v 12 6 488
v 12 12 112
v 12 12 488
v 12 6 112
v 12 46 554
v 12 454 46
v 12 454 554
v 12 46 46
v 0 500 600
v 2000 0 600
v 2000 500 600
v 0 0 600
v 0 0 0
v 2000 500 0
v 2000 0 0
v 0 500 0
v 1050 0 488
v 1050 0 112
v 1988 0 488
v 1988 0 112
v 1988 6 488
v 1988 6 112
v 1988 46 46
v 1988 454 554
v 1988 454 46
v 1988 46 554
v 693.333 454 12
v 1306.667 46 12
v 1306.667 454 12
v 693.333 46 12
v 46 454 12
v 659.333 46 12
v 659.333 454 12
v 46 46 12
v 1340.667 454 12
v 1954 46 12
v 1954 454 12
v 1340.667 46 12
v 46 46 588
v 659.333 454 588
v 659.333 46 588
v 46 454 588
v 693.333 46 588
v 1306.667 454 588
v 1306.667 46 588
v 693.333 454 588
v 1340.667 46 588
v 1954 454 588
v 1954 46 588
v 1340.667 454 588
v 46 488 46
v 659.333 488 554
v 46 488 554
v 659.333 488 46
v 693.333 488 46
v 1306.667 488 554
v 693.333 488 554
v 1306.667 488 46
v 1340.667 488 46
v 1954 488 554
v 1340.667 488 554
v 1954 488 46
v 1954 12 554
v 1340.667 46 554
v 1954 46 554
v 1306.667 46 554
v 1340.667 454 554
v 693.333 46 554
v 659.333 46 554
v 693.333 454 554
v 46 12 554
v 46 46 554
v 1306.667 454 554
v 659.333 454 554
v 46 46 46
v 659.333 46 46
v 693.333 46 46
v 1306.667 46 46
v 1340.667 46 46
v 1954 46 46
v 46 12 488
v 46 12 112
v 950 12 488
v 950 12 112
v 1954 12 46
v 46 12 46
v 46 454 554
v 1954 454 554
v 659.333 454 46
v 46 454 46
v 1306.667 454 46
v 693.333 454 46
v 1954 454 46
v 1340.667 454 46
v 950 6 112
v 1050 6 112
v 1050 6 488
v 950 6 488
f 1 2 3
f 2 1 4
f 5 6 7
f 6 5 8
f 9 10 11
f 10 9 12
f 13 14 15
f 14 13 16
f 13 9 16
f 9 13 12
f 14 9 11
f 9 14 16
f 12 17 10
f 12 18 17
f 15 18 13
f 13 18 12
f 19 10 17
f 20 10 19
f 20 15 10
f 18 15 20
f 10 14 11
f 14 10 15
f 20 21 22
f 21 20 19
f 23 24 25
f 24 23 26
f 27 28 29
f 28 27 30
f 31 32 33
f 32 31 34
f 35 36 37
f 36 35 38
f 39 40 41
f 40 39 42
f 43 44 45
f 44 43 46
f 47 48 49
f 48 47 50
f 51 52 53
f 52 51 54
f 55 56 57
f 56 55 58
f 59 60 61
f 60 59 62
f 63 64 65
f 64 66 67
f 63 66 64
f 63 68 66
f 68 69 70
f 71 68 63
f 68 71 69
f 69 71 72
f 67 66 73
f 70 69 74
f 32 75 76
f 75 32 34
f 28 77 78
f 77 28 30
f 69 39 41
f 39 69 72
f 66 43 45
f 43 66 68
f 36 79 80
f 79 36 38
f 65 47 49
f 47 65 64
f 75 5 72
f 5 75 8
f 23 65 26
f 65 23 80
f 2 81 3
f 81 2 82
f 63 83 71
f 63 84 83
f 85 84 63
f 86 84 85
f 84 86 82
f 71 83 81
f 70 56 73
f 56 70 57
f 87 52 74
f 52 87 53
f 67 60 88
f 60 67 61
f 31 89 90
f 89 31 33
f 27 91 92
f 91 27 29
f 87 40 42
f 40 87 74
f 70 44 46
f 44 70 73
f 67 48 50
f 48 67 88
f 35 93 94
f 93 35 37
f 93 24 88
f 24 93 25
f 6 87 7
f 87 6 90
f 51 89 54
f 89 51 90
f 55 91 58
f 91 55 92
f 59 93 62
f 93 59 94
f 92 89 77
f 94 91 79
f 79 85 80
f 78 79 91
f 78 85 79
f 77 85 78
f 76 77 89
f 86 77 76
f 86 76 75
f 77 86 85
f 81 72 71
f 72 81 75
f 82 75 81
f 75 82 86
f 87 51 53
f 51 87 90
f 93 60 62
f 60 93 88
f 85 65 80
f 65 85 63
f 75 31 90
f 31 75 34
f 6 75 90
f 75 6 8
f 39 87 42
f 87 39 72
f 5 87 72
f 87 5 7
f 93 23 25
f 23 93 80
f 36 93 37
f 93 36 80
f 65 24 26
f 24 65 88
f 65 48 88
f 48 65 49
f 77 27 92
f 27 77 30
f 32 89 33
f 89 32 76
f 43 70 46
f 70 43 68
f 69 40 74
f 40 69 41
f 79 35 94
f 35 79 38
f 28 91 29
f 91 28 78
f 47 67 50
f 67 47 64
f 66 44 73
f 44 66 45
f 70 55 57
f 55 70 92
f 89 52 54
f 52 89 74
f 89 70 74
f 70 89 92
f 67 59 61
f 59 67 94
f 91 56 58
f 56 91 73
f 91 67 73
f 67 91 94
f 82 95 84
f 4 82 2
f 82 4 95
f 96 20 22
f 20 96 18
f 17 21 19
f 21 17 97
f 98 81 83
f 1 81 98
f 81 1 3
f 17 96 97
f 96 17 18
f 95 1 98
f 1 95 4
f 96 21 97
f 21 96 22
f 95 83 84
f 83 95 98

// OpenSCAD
// USER VARIABLES //
// Terrarium statistics //
// Total lenght of terrarium?
terralength=2000; 
// Total height of terrarium?
terraheight=600;
// Total depth of terrarium?
terradepth=500;
// Width of the OSB boards?
boardwidth=12;
// Width of the trusses?
trusswidth=34;

// WINDOWS //
// Height of the window pane on the top?
windowpanetop=100;
// Height of the window pane on the bottom?
windowpanebottom=100;
// How much overlap should the windows have? (3cm - 5cm is common)
windowOverdraft=50;

// SUPPORTS //
// Number of additional supports, excluding trusses on the left and right?
numberofsupports=2; 

// Show/hide certain parts (will not calculate them either!)
// Show the windows?
showWindows=true;
// Show the panels on the outside?
showOuterPanels=true;
// Show the window frames?
showWindowFrames=true;
// Show the truss framework?
showFramework=true;
// Show or hide the supports?
showSupports=true;

// END OF USER VARIABLES //
// These will be derived from the above user variables and exist solely for readability.

// Outer panes
topbottompanelenght = terralength - (boardwidth*2);
backplaneheight = terraheight - (boardwidth *2);

// trusses
// vertical (blue)
verticaltrusslength = (terraheight-(trusswidth*2 + boardwidth*2));
// horizontal (red)
horizontaltrusslength = (terralength-boardwidth*2);
// deep (green)
deeptrusslength = (terradepth-(trusswidth*2+boardwidth*2));
// supports
distancebetweensupports = ((terralength - (trusswidth+boardwidth*2)) / (numberofsupports +1));


// Windows
windowlength = (terralength-(boardwidth*2)) / 2 + windowOverdraft;
windowheight = (terraheight-(boardwidth*2)-(windowpanetop + windowpanebottom));
windowwidth = (boardwidth/2);

windowplanelenght = terralength-(boardwidth*2);

echo("--8<------ BEGIN STATISTICS ------8<--");

if (showOuterPanels){
	echo(str("2x OUTER boards (orange): ", terradepth, "x", terraheight));
	echo(str("2x OUTER boards (pink): ", terradepth, "x", topbottompanelenght));
	echo(str("1x BACKPLANE board (teal): ", backplaneheight, "x", topbottompanelenght));

    // Left and right boards (orange)
	color("orange") {
		// left
		cube([boardwidth,terradepth,terraheight]);
		// right
		translate([(terralength-boardwidth),0,0]) {
			cube([boardwidth,terradepth,terraheight]);
		}
	}
	color("pink") {
		// bottom
		translate([boardwidth,0,0]) {
			cube([topbottompanelenght,terradepth,boardwidth]);
		}
		// top
		translate([boardwidth,0,(terraheight-boardwidth)]) {
			cube([topbottompanelenght,(terradepth),boardwidth]);
		}
	}
	color("teal") {
		// backplane board
		translate([boardwidth,(terradepth-boardwidth),boardwidth]) {
			cube([topbottompanelenght,boardwidth,backplaneheight]);
		}
	}
}

if(showFramework){
	color("red") {
		echo(str("4x TRUSS - horizontal (red): ", horizontaltrusslength, "(l)"));
		// Front top
		translate([boardwidth,boardwidth,(terraheight-(trusswidth+boardwidth))]) {
			cube([horizontaltrusslength,trusswidth,trusswidth]);
		}
		// Back top
		translate([boardwidth,(terradepth-(trusswidth+boardwidth)),(terraheight-(trusswidth+boardwidth))]){
			cube([horizontaltrusslength,trusswidth,trusswidth]);
		}
		// Back bottom
		translate([boardwidth,(terradepth-(trusswidth+boardwidth)),boardwidth]){
			cube([horizontaltrusslength,trusswidth,trusswidth]);
		}
		// Front bottom
		translate([boardwidth,boardwidth,boardwidth]){
			cube([horizontaltrusslength,trusswidth,trusswidth]);
		}
	}
	color("blue") {
		echo(str("4x TRUSS - vertical (blue): ", verticaltrusslength, "(l)"));
		// left front
		translate([boardwidth,boardwidth,trusswidth+boardwidth]) {
			cube([trusswidth,trusswidth,verticaltrusslength]);
		}
		// left back
		translate([boardwidth,(terradepth-(trusswidth+boardwidth)),trusswidth+boardwidth]) {
			cube([trusswidth,trusswidth,verticaltrusslength]);
		}
		// right back
		translate([(terralength-(trusswidth+boardwidth)),(terradepth-(trusswidth+boardwidth)),trusswidth+boardwidth]) {
			cube([trusswidth,trusswidth,verticaltrusslength]);
		}
		// right front
		translate([(terralength-(trusswidth+boardwidth)),boardwidth,trusswidth+boardwidth]) {
			cube([trusswidth,trusswidth,verticaltrusslength]);
		}
	}
	color("green"){
		echo(str("4x TRUSS - deep (green): ", deeptrusslength, "(l)"));
		// left bottom
		translate([boardwidth,(trusswidth+boardwidth),boardwidth]) {
			cube([trusswidth,deeptrusslength,trusswidth]);
		}
		// left top
		translate([boardwidth,trusswidth+boardwidth,(terraheight-(trusswidth+boardwidth))]) {
			cube([trusswidth,deeptrusslength,trusswidth]);
		}
		// right bottom
		translate([(terralength-(trusswidth+boardwidth)),trusswidth+boardwidth,boardwidth]) {
			cube([trusswidth,deeptrusslength,trusswidth]);
		}
		// right top
		translate([(terralength-(trusswidth+boardwidth)),trusswidth+boardwidth,(terraheight-(trusswidth+boardwidth))]) {
			cube([trusswidth,deeptrusslength,trusswidth]);
		}
	}
}

if (showSupports) {
	if(numberofsupports > 0) {
	// green
	echo(str(numberofsupports * 2, "x TRUSS - for supports, deep (green): ", deeptrusslength, "(l)"));
	echo(str(numberofsupports, "x TRUSS - for supports, vertical (blue): ", horizontaltrusslength, "(l)"));
		for (i = [1 : numberofsupports]){
			offsetleft = (distancebetweensupports*(i)+boardwidth);
			color("green") {
				// bottom
				translate([offsetleft, (trusswidth+boardwidth), boardwidth]) { 
					cube([trusswidth, deeptrusslength, trusswidth]);
				}
				// top
				translate([offsetleft, (trusswidth+boardwidth), (terraheight-(boardwidth+trusswidth))]) {
					cube([trusswidth, deeptrusslength, trusswidth]);
				}
			}
			// back
			translate([offsetleft, (terradepth-(trusswidth+boardwidth)), (boardwidth+trusswidth)]) {
				color("blue") {
					cube([trusswidth, trusswidth, verticaltrusslength]);
				}
			}
		}
	}
}

if (showWindowFrames){
	//Window frame bottom
	echo(str("1x WINDOW PANE BOTTOM (magenta): ", windowplanelenght, "(l) x ", windowpanebottom, "(h)"));
	color("magenta") {
		translate([((boardwidth)),0, boardwidth]) {
			cube([windowplanelenght, boardwidth, windowpanebottom]);
		}
	}
	echo(str("1x WINDOW PANE TOP (brown): ", windowplanelenght, "(l) x ", windowpanetop, "(h)"));
	//Window frame top
	color("brown") {
		translate([((boardwidth)),boardwidth, (terraheight-(boardwidth))]){
			rotate(a=180, v=[1,0,0]){
				 cube([windowplanelenght, boardwidth, windowpanetop]);
			}
		}
	}
}

// Windows
if (showWindows) {
	echo(str("2x WINDOW (Black): ", windowlength, "(l) x ", windowheight, "(h) x ", windowwidth, "(maximum width)"));
	color("black", 0.4) {
		translate([((boardwidth)),0,(boardwidth+windowpanebottom)]) {
			cube([windowlength, windowwidth, windowheight]);
		}
		translate([((terralength - (boardwidth+windowlength))),(boardwidth/2),(boardwidth+windowpanebottom)]){
			cube([windowlength, windowwidth, windowheight]);
		}
	}
}
echo("----8<---- END STATISTICS ----8<----");
